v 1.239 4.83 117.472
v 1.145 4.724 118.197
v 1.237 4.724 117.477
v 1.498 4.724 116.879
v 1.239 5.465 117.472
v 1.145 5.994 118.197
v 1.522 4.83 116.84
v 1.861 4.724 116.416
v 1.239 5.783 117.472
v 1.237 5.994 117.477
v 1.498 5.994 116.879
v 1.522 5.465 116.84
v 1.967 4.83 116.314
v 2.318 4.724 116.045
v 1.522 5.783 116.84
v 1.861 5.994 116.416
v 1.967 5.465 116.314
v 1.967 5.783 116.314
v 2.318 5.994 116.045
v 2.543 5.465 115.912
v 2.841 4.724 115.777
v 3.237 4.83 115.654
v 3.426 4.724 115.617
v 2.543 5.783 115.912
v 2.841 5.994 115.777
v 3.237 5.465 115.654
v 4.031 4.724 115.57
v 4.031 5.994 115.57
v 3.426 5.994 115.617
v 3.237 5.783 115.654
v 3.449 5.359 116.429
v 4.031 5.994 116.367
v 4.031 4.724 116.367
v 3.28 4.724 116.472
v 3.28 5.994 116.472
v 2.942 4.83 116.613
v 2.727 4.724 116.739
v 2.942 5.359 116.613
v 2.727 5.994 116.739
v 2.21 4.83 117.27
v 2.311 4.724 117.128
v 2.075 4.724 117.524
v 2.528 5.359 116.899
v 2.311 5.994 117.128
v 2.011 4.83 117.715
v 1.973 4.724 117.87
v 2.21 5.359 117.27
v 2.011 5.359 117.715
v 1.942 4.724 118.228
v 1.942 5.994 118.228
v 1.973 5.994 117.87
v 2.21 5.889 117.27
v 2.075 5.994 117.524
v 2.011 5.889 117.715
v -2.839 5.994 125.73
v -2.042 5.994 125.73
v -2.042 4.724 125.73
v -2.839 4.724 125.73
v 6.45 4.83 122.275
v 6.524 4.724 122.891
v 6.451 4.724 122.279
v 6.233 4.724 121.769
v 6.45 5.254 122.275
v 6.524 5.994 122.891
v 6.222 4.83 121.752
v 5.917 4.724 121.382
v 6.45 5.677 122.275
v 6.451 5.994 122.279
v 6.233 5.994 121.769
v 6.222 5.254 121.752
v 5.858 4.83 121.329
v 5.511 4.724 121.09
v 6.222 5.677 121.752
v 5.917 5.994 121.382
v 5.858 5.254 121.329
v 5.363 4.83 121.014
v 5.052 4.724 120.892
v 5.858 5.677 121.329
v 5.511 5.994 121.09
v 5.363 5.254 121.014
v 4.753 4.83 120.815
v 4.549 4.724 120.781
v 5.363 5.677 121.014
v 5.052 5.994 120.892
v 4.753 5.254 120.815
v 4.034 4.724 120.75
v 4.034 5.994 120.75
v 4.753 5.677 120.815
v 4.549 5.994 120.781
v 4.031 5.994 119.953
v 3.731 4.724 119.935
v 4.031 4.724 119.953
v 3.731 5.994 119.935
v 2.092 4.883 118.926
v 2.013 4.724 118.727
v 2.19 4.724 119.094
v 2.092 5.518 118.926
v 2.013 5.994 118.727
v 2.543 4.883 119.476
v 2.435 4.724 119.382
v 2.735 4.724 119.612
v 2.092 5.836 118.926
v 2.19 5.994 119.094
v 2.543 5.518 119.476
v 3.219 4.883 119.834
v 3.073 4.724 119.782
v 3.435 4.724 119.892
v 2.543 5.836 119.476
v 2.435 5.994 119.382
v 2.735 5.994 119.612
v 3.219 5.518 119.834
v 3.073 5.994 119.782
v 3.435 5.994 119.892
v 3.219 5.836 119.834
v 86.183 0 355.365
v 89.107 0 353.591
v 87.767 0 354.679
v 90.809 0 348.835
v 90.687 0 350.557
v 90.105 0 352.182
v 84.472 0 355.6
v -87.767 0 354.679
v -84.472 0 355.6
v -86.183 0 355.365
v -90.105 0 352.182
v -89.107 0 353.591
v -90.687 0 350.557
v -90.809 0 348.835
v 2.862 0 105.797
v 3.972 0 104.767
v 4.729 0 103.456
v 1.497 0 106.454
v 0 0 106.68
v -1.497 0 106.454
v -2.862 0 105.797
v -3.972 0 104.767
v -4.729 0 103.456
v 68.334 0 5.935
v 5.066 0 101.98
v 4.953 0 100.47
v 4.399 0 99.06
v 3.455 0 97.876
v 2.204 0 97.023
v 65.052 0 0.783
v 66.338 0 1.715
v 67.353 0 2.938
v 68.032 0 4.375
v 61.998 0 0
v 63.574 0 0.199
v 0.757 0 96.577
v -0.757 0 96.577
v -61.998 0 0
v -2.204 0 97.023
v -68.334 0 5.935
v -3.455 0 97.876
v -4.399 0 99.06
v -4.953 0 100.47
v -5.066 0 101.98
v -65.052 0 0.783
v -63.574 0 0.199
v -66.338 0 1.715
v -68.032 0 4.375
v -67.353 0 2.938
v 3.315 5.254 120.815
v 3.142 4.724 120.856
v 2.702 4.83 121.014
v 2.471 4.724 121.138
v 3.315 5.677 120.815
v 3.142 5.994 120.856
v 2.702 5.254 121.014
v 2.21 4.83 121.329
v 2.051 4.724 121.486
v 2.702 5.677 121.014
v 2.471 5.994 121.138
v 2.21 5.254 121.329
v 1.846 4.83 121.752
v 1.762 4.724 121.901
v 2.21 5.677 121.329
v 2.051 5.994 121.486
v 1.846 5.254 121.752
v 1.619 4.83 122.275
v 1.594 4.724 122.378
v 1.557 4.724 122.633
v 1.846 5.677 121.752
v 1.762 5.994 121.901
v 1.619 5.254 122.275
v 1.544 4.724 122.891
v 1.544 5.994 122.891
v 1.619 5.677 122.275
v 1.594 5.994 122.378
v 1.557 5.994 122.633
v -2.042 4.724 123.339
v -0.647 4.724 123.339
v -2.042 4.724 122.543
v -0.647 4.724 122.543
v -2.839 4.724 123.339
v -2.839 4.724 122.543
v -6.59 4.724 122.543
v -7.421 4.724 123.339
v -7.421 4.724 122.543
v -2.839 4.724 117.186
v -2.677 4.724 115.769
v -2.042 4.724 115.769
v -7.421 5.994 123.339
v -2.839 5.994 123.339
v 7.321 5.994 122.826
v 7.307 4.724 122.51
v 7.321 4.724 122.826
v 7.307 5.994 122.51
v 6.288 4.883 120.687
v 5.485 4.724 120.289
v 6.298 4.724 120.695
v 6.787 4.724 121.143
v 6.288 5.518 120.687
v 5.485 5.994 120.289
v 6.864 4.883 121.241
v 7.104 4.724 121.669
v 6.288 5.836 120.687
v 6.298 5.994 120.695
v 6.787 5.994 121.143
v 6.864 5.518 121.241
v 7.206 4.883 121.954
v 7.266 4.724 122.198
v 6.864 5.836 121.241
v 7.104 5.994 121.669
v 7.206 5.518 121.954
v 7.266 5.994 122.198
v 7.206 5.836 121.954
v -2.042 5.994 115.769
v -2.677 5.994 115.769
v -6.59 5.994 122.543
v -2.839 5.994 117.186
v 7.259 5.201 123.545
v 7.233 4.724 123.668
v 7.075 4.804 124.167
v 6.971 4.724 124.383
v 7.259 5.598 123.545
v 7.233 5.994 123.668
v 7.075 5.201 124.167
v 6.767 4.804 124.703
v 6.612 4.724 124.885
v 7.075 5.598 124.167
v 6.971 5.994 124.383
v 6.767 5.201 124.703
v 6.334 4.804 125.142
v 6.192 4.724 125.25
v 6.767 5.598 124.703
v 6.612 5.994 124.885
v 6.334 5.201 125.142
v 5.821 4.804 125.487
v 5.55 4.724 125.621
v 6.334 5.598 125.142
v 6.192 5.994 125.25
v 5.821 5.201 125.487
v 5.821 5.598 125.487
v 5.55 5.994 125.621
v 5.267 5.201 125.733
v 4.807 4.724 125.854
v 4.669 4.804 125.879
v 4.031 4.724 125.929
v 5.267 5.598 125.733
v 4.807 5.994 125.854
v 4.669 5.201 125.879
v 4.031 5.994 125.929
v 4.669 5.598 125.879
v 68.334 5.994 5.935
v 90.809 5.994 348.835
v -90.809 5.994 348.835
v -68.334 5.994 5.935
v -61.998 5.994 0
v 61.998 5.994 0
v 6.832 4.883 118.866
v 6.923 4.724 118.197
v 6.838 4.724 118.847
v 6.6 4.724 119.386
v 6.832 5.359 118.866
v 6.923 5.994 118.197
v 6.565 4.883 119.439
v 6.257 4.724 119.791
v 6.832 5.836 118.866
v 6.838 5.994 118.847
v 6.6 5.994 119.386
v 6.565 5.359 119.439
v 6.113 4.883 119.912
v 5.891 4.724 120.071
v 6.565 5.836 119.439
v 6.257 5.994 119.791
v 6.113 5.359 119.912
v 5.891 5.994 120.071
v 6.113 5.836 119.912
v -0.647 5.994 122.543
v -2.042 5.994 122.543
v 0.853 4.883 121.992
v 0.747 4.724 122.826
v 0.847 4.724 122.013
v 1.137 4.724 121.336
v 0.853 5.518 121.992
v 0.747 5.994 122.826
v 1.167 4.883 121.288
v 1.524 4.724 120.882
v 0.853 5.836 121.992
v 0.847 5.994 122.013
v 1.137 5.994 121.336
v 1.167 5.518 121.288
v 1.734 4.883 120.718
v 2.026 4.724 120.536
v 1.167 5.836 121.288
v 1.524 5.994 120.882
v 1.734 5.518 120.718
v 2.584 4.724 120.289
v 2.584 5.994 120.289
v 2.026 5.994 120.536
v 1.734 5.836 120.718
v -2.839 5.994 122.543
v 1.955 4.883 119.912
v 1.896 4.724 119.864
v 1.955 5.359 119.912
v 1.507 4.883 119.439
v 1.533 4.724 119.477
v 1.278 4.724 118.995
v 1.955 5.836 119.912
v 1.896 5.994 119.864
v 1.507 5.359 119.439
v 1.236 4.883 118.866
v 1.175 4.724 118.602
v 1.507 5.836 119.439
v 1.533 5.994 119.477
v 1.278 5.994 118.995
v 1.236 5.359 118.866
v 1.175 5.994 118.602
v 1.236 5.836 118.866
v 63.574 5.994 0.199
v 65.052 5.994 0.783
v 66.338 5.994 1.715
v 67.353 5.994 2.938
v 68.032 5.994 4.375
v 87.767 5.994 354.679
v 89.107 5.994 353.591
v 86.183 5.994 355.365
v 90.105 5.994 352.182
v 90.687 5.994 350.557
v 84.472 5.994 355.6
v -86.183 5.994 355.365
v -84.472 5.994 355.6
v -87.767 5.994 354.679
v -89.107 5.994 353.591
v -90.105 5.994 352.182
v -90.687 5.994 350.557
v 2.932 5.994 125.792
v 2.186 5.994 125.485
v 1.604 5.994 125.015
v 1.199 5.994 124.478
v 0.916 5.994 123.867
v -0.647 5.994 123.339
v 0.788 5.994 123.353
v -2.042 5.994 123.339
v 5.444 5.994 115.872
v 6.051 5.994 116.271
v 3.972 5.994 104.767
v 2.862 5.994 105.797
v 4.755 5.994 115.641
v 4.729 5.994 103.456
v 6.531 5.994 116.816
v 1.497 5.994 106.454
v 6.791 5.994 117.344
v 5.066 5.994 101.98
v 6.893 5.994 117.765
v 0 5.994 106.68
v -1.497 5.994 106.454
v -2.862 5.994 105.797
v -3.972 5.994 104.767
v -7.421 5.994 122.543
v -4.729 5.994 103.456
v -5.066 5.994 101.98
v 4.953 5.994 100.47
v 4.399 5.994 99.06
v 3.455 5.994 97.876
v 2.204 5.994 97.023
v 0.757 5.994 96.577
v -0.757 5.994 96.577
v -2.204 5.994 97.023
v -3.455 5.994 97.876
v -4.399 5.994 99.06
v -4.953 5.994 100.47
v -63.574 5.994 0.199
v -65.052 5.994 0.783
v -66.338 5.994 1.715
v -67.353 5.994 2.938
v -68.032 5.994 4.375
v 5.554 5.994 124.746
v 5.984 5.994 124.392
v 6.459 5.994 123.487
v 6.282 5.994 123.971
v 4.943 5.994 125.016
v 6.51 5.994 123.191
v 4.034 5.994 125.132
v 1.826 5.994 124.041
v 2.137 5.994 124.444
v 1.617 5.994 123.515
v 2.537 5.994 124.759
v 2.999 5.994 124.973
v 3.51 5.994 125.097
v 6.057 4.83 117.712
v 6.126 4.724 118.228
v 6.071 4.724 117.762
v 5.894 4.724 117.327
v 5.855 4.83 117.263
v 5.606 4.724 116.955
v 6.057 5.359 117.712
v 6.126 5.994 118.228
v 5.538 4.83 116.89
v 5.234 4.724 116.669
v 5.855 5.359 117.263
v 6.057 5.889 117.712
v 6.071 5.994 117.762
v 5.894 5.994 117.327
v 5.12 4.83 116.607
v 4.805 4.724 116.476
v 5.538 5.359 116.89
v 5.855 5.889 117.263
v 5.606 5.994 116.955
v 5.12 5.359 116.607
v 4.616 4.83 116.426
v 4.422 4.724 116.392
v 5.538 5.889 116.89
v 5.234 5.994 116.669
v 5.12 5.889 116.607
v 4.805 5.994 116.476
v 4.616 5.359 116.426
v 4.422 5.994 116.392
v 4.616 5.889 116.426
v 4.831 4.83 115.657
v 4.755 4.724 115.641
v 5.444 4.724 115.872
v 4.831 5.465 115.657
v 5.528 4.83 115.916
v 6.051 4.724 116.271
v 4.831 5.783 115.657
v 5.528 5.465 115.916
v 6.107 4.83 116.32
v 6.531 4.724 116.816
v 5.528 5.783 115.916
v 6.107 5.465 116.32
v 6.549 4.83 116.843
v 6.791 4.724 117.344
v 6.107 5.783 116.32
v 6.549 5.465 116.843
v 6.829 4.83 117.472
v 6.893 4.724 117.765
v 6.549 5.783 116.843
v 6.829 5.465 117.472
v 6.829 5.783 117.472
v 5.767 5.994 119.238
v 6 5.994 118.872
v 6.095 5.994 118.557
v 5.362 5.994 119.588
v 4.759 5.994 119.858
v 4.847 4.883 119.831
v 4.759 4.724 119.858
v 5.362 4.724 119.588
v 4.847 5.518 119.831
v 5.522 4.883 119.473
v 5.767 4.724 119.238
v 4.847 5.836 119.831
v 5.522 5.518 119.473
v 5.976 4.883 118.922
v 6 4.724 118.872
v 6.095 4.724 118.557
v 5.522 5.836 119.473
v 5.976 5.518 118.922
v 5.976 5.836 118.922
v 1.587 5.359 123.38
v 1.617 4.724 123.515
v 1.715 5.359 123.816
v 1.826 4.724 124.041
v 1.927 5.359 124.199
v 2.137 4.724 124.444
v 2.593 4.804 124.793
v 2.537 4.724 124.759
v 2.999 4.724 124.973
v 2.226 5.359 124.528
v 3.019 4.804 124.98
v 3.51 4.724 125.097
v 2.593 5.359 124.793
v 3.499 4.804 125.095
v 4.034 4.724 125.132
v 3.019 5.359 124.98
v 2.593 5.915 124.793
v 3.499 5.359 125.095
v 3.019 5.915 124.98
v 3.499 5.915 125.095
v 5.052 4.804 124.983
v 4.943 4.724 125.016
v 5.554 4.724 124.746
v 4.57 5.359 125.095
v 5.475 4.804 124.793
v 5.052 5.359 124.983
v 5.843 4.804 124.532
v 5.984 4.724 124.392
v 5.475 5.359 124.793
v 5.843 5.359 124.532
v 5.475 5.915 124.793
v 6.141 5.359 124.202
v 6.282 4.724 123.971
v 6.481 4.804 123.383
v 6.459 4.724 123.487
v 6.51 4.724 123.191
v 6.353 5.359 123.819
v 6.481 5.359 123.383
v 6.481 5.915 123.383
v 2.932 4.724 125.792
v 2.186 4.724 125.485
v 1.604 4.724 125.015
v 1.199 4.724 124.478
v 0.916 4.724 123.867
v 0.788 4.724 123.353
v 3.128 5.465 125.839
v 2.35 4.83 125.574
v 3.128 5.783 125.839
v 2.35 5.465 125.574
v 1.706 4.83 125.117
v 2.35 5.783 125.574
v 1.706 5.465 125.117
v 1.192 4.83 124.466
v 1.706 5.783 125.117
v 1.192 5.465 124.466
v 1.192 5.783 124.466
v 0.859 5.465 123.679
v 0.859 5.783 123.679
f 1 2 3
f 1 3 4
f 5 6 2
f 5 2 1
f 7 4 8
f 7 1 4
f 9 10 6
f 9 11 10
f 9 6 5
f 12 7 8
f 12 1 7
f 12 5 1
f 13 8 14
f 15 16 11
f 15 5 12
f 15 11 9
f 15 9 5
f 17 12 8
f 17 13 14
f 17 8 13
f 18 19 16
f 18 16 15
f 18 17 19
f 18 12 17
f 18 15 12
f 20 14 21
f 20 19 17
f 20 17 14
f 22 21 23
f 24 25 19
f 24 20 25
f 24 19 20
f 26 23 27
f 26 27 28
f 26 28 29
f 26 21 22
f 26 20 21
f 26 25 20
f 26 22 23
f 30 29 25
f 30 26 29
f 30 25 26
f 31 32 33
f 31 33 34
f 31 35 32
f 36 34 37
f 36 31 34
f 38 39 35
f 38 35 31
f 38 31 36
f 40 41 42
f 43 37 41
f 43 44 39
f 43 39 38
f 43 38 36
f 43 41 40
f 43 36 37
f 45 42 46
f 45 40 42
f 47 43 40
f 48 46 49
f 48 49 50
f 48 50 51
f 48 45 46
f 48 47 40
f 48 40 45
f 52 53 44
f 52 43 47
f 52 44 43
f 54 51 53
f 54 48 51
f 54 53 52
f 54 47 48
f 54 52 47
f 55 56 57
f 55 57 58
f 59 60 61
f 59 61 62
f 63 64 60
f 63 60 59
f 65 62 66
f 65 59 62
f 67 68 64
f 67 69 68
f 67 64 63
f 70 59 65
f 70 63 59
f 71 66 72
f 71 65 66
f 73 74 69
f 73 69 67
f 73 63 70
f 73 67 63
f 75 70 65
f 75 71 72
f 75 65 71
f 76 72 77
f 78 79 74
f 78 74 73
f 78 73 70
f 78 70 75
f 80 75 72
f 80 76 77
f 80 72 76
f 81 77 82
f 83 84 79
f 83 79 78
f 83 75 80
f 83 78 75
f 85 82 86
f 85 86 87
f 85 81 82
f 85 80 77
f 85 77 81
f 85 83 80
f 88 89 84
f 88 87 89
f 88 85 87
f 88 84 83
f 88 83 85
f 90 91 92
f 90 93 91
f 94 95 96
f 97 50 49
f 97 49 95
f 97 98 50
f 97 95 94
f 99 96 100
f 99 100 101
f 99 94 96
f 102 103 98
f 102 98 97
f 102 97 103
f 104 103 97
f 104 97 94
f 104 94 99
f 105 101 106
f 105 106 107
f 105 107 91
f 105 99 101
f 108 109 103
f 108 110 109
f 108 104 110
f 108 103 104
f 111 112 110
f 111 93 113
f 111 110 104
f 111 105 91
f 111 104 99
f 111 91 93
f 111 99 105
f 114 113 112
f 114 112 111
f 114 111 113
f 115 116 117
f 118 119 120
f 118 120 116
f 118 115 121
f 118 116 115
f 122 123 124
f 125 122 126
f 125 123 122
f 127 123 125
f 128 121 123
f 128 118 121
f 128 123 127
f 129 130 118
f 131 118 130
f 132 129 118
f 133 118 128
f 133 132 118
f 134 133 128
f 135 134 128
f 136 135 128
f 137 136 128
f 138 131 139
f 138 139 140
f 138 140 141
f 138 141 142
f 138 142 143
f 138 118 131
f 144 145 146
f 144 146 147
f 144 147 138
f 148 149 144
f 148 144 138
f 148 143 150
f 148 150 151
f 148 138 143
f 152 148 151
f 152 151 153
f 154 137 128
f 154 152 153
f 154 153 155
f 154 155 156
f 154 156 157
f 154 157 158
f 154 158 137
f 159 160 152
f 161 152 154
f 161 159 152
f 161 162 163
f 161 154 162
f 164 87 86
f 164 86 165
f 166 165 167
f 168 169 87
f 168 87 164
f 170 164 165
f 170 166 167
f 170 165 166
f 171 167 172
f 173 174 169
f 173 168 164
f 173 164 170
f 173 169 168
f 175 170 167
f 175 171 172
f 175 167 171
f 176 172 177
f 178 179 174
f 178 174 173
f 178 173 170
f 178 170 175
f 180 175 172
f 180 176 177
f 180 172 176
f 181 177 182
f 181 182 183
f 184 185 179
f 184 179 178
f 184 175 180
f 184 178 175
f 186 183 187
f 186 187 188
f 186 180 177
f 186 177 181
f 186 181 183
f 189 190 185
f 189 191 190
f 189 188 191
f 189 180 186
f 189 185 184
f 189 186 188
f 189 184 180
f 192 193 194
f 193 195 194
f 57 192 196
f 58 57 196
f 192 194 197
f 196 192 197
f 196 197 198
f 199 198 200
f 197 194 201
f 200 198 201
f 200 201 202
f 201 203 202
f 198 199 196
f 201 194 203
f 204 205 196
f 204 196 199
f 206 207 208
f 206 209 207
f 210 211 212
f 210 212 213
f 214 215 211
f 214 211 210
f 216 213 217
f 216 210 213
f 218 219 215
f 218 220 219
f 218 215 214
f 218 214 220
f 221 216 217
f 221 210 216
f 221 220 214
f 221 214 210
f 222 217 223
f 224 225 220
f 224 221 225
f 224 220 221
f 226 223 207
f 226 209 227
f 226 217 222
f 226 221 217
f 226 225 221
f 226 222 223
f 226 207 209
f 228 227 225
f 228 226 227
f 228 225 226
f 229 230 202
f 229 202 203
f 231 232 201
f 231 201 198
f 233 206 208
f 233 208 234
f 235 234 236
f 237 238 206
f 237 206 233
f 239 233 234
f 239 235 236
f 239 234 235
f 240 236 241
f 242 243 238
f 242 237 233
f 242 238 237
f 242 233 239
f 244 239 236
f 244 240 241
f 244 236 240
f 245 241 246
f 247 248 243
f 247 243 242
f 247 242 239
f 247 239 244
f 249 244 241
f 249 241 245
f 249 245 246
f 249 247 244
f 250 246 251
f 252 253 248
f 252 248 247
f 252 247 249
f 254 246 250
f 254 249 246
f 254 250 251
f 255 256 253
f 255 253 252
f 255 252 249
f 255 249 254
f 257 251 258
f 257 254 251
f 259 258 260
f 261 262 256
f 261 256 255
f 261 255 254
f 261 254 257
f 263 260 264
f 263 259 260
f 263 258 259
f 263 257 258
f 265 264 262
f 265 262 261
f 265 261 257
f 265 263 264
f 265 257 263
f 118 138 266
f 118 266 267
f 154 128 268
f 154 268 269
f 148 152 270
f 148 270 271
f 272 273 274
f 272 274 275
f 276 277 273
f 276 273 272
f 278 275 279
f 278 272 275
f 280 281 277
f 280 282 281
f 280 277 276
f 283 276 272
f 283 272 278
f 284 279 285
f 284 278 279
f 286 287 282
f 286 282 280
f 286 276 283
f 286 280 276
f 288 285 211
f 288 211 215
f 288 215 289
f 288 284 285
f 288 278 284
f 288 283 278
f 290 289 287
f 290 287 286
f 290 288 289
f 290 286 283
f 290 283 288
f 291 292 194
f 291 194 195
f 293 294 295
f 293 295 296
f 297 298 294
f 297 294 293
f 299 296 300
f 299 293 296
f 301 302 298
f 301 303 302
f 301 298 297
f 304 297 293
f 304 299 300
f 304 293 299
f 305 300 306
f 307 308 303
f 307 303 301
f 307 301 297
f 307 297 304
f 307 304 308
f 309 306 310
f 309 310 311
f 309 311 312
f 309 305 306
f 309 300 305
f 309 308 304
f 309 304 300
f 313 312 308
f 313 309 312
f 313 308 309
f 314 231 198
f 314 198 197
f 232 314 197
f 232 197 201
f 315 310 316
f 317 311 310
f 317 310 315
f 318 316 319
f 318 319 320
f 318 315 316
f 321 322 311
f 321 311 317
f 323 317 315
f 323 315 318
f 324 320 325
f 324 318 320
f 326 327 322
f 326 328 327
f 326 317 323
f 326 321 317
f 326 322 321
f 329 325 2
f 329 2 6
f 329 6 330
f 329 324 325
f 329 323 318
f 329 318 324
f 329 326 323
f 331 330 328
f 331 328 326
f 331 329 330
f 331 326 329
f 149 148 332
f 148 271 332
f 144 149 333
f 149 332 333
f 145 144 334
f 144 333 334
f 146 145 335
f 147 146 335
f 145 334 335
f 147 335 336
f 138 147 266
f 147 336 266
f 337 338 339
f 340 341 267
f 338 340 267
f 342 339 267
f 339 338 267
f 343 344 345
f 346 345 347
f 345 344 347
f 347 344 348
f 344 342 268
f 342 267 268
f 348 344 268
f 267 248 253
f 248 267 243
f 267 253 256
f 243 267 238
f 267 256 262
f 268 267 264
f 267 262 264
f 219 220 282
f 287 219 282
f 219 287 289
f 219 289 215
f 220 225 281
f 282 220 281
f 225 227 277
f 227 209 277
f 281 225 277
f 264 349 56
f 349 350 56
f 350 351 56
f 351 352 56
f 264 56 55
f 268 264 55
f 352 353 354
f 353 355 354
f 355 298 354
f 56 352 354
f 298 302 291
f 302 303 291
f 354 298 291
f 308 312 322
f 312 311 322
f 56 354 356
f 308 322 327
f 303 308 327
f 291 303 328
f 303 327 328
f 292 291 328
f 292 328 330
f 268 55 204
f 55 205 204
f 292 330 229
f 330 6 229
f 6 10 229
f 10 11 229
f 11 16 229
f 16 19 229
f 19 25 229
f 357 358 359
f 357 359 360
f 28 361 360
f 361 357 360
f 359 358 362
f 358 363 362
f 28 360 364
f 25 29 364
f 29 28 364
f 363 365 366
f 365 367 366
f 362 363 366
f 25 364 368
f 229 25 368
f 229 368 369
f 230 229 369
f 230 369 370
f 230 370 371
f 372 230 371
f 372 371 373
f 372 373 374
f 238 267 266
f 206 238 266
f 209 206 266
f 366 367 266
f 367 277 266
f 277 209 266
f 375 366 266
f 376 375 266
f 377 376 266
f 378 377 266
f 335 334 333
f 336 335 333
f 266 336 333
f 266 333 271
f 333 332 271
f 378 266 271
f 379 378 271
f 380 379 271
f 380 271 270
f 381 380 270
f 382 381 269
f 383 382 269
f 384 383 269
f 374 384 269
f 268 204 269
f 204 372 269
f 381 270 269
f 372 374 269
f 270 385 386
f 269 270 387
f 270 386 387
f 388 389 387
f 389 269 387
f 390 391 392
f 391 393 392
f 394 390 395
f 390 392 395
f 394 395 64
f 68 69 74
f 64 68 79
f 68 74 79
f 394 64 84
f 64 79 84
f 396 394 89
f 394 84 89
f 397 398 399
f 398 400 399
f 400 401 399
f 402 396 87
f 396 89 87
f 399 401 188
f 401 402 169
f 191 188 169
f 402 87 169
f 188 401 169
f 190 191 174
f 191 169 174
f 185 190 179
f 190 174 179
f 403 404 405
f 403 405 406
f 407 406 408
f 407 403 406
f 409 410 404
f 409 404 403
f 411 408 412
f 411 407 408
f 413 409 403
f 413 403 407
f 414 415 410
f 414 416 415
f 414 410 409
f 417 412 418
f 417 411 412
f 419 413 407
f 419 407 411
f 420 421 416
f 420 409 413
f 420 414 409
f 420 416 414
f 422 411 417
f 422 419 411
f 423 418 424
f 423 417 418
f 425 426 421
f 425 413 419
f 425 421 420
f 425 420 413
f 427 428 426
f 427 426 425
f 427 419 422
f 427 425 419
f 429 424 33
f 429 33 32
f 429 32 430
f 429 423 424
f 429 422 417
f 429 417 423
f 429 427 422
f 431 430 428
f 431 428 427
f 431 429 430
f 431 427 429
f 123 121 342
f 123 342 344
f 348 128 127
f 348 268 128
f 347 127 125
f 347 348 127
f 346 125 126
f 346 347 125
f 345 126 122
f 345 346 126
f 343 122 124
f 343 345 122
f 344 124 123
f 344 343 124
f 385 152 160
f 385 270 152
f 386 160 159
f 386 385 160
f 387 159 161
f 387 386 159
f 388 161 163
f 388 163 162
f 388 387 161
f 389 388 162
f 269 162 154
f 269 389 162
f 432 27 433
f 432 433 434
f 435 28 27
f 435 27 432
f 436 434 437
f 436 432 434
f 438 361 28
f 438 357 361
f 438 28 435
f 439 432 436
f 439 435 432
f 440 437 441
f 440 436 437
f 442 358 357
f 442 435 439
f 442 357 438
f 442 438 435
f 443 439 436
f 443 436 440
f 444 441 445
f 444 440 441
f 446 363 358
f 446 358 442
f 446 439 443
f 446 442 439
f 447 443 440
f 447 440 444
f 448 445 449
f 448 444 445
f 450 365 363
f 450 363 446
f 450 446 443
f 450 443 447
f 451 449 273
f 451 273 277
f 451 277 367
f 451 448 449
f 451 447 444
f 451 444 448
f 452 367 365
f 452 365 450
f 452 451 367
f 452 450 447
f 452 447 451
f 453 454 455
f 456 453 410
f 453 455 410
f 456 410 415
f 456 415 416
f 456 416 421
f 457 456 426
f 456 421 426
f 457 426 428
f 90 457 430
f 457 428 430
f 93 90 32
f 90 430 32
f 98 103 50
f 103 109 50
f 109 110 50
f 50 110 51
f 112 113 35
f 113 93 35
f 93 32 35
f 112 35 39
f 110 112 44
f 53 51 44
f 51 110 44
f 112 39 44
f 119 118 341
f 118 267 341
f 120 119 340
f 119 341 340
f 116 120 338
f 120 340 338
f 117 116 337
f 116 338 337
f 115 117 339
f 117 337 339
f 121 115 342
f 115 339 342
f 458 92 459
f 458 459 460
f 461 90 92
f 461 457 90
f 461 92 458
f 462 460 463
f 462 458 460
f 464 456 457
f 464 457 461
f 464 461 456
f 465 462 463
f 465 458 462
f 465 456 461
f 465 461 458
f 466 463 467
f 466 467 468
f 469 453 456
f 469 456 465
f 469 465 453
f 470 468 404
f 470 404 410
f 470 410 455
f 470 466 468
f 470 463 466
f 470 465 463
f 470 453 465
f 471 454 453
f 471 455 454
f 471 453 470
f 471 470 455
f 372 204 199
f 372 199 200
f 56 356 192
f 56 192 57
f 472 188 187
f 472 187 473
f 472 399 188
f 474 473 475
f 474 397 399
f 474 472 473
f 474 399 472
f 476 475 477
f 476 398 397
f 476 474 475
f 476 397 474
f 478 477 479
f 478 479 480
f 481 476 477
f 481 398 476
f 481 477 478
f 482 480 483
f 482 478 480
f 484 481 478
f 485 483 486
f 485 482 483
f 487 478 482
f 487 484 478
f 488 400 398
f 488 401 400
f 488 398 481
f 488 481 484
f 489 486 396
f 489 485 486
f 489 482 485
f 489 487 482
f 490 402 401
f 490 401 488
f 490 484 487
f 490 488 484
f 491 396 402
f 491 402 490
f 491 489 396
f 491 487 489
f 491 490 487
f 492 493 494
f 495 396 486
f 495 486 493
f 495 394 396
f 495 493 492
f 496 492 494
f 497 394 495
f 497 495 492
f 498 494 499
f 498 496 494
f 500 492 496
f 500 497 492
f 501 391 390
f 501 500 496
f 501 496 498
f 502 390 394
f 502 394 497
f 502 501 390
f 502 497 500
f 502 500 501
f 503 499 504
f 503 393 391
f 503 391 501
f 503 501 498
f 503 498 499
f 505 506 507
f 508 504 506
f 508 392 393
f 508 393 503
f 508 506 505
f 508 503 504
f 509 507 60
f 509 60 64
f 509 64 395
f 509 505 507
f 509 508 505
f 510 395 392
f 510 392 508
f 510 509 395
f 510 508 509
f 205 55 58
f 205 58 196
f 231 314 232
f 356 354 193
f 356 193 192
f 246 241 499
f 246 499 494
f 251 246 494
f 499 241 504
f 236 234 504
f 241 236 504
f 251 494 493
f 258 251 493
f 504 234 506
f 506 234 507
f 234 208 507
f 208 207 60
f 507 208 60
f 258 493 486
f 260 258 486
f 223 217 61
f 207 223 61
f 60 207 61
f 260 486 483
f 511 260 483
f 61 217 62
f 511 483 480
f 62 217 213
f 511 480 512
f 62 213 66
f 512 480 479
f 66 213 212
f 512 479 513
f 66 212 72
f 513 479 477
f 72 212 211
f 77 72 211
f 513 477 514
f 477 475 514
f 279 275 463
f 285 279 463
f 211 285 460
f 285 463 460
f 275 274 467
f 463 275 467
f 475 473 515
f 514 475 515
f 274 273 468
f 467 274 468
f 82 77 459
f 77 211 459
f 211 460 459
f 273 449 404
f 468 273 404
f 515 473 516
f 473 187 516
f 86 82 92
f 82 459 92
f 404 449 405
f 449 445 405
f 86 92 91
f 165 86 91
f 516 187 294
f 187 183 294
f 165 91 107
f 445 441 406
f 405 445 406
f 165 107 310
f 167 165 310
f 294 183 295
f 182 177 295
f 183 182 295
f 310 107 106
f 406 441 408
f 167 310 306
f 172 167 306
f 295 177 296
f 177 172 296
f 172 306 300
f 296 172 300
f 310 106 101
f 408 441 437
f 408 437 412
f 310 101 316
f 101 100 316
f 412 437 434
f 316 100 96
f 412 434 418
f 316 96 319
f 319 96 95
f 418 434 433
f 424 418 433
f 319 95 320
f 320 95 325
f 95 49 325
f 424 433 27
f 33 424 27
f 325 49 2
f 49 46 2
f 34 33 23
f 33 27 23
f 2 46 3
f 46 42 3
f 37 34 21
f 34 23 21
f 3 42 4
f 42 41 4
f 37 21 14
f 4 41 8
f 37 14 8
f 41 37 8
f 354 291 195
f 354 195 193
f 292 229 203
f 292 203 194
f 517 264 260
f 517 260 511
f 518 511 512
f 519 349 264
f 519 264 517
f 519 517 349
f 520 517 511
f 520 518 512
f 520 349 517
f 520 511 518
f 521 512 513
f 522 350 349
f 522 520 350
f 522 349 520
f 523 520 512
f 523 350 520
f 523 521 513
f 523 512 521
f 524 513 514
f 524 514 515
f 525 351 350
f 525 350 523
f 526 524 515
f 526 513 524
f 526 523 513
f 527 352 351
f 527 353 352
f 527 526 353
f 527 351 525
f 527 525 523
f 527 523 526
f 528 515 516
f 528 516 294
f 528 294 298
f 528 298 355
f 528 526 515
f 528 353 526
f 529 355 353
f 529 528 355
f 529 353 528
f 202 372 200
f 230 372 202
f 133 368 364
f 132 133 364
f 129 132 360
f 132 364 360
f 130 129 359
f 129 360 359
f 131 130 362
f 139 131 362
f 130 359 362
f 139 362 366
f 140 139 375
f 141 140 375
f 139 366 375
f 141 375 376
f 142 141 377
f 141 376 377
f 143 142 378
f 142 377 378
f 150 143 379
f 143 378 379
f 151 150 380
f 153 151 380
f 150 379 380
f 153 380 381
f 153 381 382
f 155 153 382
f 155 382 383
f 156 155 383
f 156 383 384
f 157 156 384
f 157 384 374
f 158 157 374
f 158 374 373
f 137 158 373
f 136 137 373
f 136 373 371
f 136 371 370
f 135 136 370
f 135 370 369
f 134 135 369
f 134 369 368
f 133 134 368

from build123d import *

# Parameters (mm, degrees)
BOSS_EXTRUDE1_DEPTH = 5.9944
SKETCH2_R           = 5.08
CUT_EXTRUDE1_DEPTH  = 368.170623747
CUT_EXTRUDE2_DEPTH  = 1.27
FILLET1_R           = 6.35


with BuildPart() as part:
    # Sketch1 → Boss-Extrude1 (new body)
    with BuildSketch(Plane(origin=(0, 0, 0), x_dir=(1, 0, 0), z_dir=(0, 1, 0))):
        Polygon((-67.945, 0), (67.945, 0), (91.252255377, -355.6), (-91.252255377, -355.6), align=None)
    extrude(amount=BOSS_EXTRUDE1_DEPTH)

    # Sketch2 → Cut-Extrude1 (cut, through all)
    with BuildSketch(Plane(origin=(0, 5.9944, 0), x_dir=(1, 0, 0), z_dir=(0, 1, 0))):
        with Locations(Location((0, -101.6, 0), (0, 0, 270))):
            Circle(SKETCH2_R)
    extrude(amount=-CUT_EXTRUDE1_DEPTH, mode=Mode.SUBTRACT)

    # Sketch3 → Cut-Extrude2 (cut)
    # profile 1 of 2: a face of its own
    with BuildSketch(Plane(origin=(0, 5.9944, 0), x_dir=(1, 0, 0), z_dir=(0, 1, 0))):
        Polygon((-0.64745098, -123.339411765), (-2.041960784, -123.339411765), (-2.041960784, -125.73), (-2.838823529, -125.73), (-2.838823529, -123.339411765), (-7.420784314, -123.339411765), (-7.420784314, -122.54254902), (-2.676960784, -115.769215686), (-2.041960784, -115.769215686), (-2.041960784, -122.54254902), (-0.64745098, -122.54254902), align=None)
        Polygon((-2.838823529, -122.54254902), (-2.838823529, -117.185514706), (-6.589681373, -122.54254902), align=None, mode=Mode.SUBTRACT)
    # profile 2 of 2: a face of its own
    with BuildSketch(Plane(origin=(0, 5.9944, 0), x_dir=(1, 0, 0), z_dir=(0, 1, 0))):
        with BuildLine():
            add(Edge.make_bspline(
                [(2.583578431, -120.288921569), (2.469757768, -120.233881465), (2.249012298, -120.12713588), (1.956518664, -119.921342429), (1.702152679, -119.699076506), (1.501146738, -119.44377738), (1.338617892, -119.168616459), (1.228149162, -118.865639865), (1.155782886, -118.539856671), (1.148992832, -118.313778727), (1.145490196, -118.197156863)],
                knots=[0, 0, 0, 0, 1.121505956, 2.175065151, 3.167266929, 4.111724904, 5.049364576, 5.994542137, 6.965488487, 8, 8, 8, 8], degree=3))
            add(Edge.make_bspline(
                [(1.145490196, -118.197156863), (1.150650446, -118.072365116), (1.160750204, -117.828119903), (1.228851738, -117.472785505), (1.349283719, -117.141800757), (1.514672213, -116.835914328), (1.722446411, -116.558323216), (1.961706137, -116.307792449), (2.237618257, -116.091502351), (2.542166789, -115.903299875), (2.878819269, -115.755673627), (3.240549794, -115.643784068), (3.628448984, -115.583063263), (3.894888198, -115.574417097), (4.031004902, -115.57)],
                knots=[0, 0, 0, 0, 1.029797524, 2.015542871, 2.97168719, 3.925682005, 4.874436321, 5.825197768, 6.775997772, 7.759919145, 8.771905717, 9.801204739, 10.876694018, 12, 12, 12, 12], degree=3))
            add(Edge.make_bspline(
                [(4.031004902, -115.57), (4.168265453, -115.573915681), (4.437144184, -115.581586081), (4.826482227, -115.649360813), (5.193306386, -115.752803643), (5.528540282, -115.908692567), (5.837903626, -116.092702905), (6.1102298, -116.31471085), (6.35377186, -116.560126292), (6.554706316, -116.839931798), (6.724312123, -117.141452673), (6.837039409, -117.474041466), (6.912766198, -117.827458116), (6.919373101, -118.072230943), (6.922745098, -118.197156863)],
                knots=[0, 0, 0, 0, 1.129990317, 2.213530109, 3.246876235, 4.260696229, 5.250296002, 6.204863837, 7.14791721, 8.090040244, 9.034951547, 9.986644228, 10.972433637, 12, 12, 12, 12], degree=3))
            add(Edge.make_bspline(
                [(6.922745098, -118.197156863), (6.919216595, -118.313762788), (6.912376396, -118.539809833), (6.840365414, -118.865811955), (6.728782095, -119.16750517), (6.571087227, -119.445784939), (6.365570739, -119.697892228), (6.112007529, -119.921560928), (5.819142842, -120.127075675), (5.598450258, -120.233860983), (5.484656863, -120.288921569)],
                knots=[0, 0, 0, 0, 1.034356649, 2.00515765, 2.950193721, 3.883105322, 4.833207204, 5.825260452, 6.878661931, 8, 8, 8, 8], degree=3))
            add(Edge.make_bspline(
                [(5.484656863, -120.288921569), (5.629584904, -120.345274008), (5.909015189, -120.453925018), (6.287487251, -120.674211509), (6.609031926, -120.93355376), (6.873327893, -121.233567804), (7.075041903, -121.576427985), (7.218061472, -121.958672451), (7.307398658, -122.379704945), (7.316483523, -122.673858557), (7.321176471, -122.825808824)],
                knots=[0, 0, 0, 0, 1.104307536, 2.129173671, 3.099289652, 4.029922044, 4.956040619, 5.91100379, 6.920891952, 8, 8, 8, 8], degree=3))
            add(Edge.make_bspline(
                [(7.321176471, -122.825808824), (7.318321613, -122.949426035), (7.312758231, -123.190324178), (7.265802022, -123.539824084), (7.187729342, -123.864910338), (7.08225254, -124.169001718), (6.941227364, -124.448040534), (6.773245337, -124.7078841), (6.567526726, -124.937879056), (6.337999195, -125.1468091), (6.085093931, -125.326864216), (5.825207776, -125.49131202), (5.550637227, -125.624540533), (5.268662499, -125.738439853), (4.972715633, -125.821171296), (4.668146304, -125.883957252), (4.352586022, -125.922213573), (4.139017278, -125.926863823), (4.031004902, -125.929215686)],
                knots=[0, 0, 0, 0, 1.165158113, 2.270593413, 3.316967265, 4.313258111, 5.297614584, 6.258105811, 7.221631145, 8.198179015, 9.17849254, 10.144943439, 11.094310651, 12.051658199, 13.00840578, 13.986862741, 14.981855988, 16, 16, 16, 16], degree=3))
            add(Edge.make_bspline(
                [(4.031004902, -125.929215686), (3.875058258, -125.925696781), (3.571935445, -125.918856875), (3.134122695, -125.846848764), (2.72518677, -125.740751294), (2.34901118, -125.583969435), (2.003278658, -125.380987257), (1.698555205, -125.12058817), (1.419046499, -124.819504607), (1.183989068, -124.46822424), (0.986969857, -124.087207102), (0.851225779, -123.680518964), (0.762222762, -123.259231693), (0.752157029, -122.971528144), (0.747058824, -122.825808824)],
                knots=[0, 0, 0, 0, 1.105131574, 2.1481103, 3.138917951, 4.095657432, 5.029651657, 5.970060793, 6.928497124, 7.934844507, 8.958454957, 9.961540876, 10.967538361, 12, 12, 12, 12], degree=3))
            add(Edge.make_bspline(
                [(0.747058824, -122.825808824), (0.750958552, -122.681150729), (0.75854413, -122.399768191), (0.842695471, -121.995459368), (0.973276047, -121.622346822), (1.158365157, -121.279786493), (1.410049218, -120.969502557), (1.737856358, -120.703220915), (2.131081537, -120.465798713), (2.427881476, -120.34978217), (2.583578431, -120.288921569)],
                knots=[0, 0, 0, 0, 1.026535231, 1.996771007, 2.920245165, 3.827596735, 4.74995178, 5.739273443, 6.81405554, 8, 8, 8, 8], degree=3))
        make_face()
        with BuildLine():
            add(Edge.make_bspline(
                [(6.125882353, -118.228284314), (6.123712551, -118.138717354), (6.119482737, -117.964115492), (6.062504916, -117.712266336), (5.98038969, -117.47610598), (5.859680999, -117.260408538), (5.712107035, -117.063654994), (5.541353334, -116.884667003), (5.342009506, -116.731408764), (5.12047127, -116.600704242), (4.877544231, -116.494065356), (4.612645581, -116.419299497), (4.328142503, -116.37607471), (4.131800472, -116.369987645), (4.031004902, -116.366862745)],
                knots=[0, 0, 0, 0, 1.025357551, 1.998832358, 2.947617169, 3.885211583, 4.820763882, 5.76355694, 6.713535567, 7.695415045, 8.708191046, 9.748023335, 10.843908909, 12, 12, 12, 12], degree=3))
            add(Edge.make_bspline(
                [(4.031004902, -116.366862745), (3.930115428, -116.369479246), (3.734451772, -116.374553651), (3.45109005, -116.424626768), (3.184332955, -116.495249758), (2.942679865, -116.608198219), (2.718840309, -116.735817229), (2.525804645, -116.895504967), (2.351663826, -117.06954252), (2.205860677, -117.266948572), (2.084614049, -117.480848146), (2.006076015, -117.716918532), (1.948805302, -117.966145907), (1.944532402, -118.139739939), (1.942352941, -118.228284314)],
                knots=[0, 0, 0, 0, 1.159100913, 2.247944337, 3.301963364, 4.322203238, 5.306638987, 6.257145066, 7.193841607, 8.131829567, 9.071864958, 10.007877085, 10.983886281, 12, 12, 12, 12], degree=3))
            add(Edge.make_bspline(
                [(1.942352941, -118.228284314), (1.949031284, -118.351609409), (1.962012851, -118.591332492), (2.078543183, -118.932570023), (2.275975601, -119.230977841), (2.538899021, -119.489874585), (2.859494616, -119.695110648), (3.219184028, -119.847237085), (3.614969422, -119.934652524), (3.889465343, -119.946589818), (4.031004902, -119.952745098)],
                knots=[0, 0, 0, 0, 0.976469849, 1.898091887, 2.820632736, 3.792824454, 4.804409425, 5.822739039, 6.877329201, 8, 8, 8, 8], degree=3))
            add(Edge.make_bspline(
                [(4.031004902, -119.952745098), (4.173676734, -119.947027996), (4.449626377, -119.935970226), (4.845443805, -119.843138475), (5.205858473, -119.692440852), (5.5262161, -119.485656096), (5.792340565, -119.229006795), (5.989565911, -118.929321811), (6.105911534, -118.589249373), (6.119116744, -118.350570163), (6.125882353, -118.228284314)],
                knots=[0, 0, 0, 0, 1.129790696, 2.185191953, 3.202539324, 4.213148559, 5.190270146, 6.111921147, 7.032654223, 8, 8, 8, 8], degree=3))
        make_face(mode=Mode.SUBTRACT)
        with BuildLine():
            add(Edge.make_bspline(
                [(6.524313725, -122.891176471), (6.520920106, -122.784069548), (6.514346152, -122.576587224), (6.457940803, -122.276145516), (6.360243009, -122.001268427), (6.229636966, -121.747680515), (6.058383341, -121.524547206), (5.861403172, -121.319861355), (5.625352542, -121.150730147), (5.361894512, -121.006677276), (5.069527463, -120.890509463), (4.748625434, -120.807841497), (4.399931987, -120.756977985), (4.158809369, -120.752120035), (4.034117647, -120.749607843)],
                knots=[0, 0, 0, 0, 1.039609951, 2.013881847, 2.953999013, 3.864434323, 4.771294027, 5.676192345, 6.613334877, 7.578339998, 8.586868343, 9.659784589, 10.789804577, 12, 12, 12, 12], degree=3))
            add(Edge.make_bspline(
                [(4.034117647, -120.749607843), (3.909429768, -120.752131017), (3.668314581, -120.757010204), (3.319569101, -120.807725005), (2.99791307, -120.891154926), (2.704071746, -121.0060513), (2.440098851, -121.149817241), (2.206601469, -121.320933406), (2.00975895, -121.524422815), (1.838623351, -121.747713983), (1.707985337, -122.001259134), (1.610296441, -122.276148125), (1.553888608, -122.576586511), (1.547315006, -122.784069305), (1.543921569, -122.891176471)],
                knots=[0, 0, 0, 0, 1.210068076, 2.339969154, 3.412772499, 4.430563009, 5.395466584, 6.324404951, 7.229208048, 8.135972324, 9.046311831, 9.98633007, 10.960499445, 12, 12, 12, 12], degree=3))
            add(Edge.make_bspline(
                [(1.543921569, -122.891176471), (1.544985709, -122.975375962), (1.547058013, -123.139345961), (1.584332291, -123.377568996), (1.635643144, -123.60328801), (1.710828263, -123.816382724), (1.807662765, -124.01525168), (1.923393036, -124.202835216), (2.065441305, -124.372501414), (2.222512089, -124.532765628), (2.401927227, -124.670707654), (2.59105853, -124.797903891), (2.798953829, -124.900320608), (3.020681135, -124.982957849), (3.253996345, -125.05338774), (3.502487363, -125.098599125), (3.763661295, -125.12731722), (3.942730319, -125.130651369), (4.034117647, -125.132352941)],
                knots=[0, 0, 0, 0, 1.068010984, 2.079843423, 3.054621512, 4.004777055, 4.941776883, 5.859399066, 6.795750163, 7.746088411, 8.702980793, 9.664127459, 10.636408857, 11.637286391, 12.667146169, 13.726670379, 14.839813183, 16, 16, 16, 16], degree=3))
            add(Edge.make_bspline(
                [(4.034117647, -125.132352941), (4.125501134, -125.13064464), (4.304562631, -125.127297307), (4.56680524, -125.098562307), (4.815810816, -125.052774976), (5.050277608, -124.987318412), (5.270990902, -124.903366885), (5.475354786, -124.796869735), (5.667389124, -124.674485413), (5.845554591, -124.535609475), (6.002838181, -124.375684848), (6.144831297, -124.205929646), (6.260573544, -124.018369128), (6.357414326, -123.819495237), (6.432561156, -123.606396774), (6.484253282, -123.379696319), (6.520966694, -123.140347845), (6.523182823, -122.975367067), (6.524313725, -122.891176471)],
                knots=[0, 0, 0, 0, 1.159544989, 2.272071989, 3.343950718, 4.369611888, 5.357637803, 6.335341631, 7.288798869, 8.245161887, 9.194974397, 10.130807493, 11.047922037, 11.984403507, 12.934033413, 13.908272243, 14.932579852, 16, 16, 16, 16], degree=3))
        make_face(mode=Mode.SUBTRACT)
    extrude(amount=-CUT_EXTRUDE2_DEPTH, mode=Mode.SUBTRACT)

    # Fillet1
    fillet1_edges = [part.edges().sort_by_distance(p)[0] for p in [
        (91.252255377, 2.9972, 355.6),
        (-91.252255377, 2.9972, 355.6),
        (-67.945, 2.9972, 0),
        (67.945, 2.9972, 0),
    ]]
    fillet(fillet1_edges, radius=FILLET1_R)


solid = part.part
